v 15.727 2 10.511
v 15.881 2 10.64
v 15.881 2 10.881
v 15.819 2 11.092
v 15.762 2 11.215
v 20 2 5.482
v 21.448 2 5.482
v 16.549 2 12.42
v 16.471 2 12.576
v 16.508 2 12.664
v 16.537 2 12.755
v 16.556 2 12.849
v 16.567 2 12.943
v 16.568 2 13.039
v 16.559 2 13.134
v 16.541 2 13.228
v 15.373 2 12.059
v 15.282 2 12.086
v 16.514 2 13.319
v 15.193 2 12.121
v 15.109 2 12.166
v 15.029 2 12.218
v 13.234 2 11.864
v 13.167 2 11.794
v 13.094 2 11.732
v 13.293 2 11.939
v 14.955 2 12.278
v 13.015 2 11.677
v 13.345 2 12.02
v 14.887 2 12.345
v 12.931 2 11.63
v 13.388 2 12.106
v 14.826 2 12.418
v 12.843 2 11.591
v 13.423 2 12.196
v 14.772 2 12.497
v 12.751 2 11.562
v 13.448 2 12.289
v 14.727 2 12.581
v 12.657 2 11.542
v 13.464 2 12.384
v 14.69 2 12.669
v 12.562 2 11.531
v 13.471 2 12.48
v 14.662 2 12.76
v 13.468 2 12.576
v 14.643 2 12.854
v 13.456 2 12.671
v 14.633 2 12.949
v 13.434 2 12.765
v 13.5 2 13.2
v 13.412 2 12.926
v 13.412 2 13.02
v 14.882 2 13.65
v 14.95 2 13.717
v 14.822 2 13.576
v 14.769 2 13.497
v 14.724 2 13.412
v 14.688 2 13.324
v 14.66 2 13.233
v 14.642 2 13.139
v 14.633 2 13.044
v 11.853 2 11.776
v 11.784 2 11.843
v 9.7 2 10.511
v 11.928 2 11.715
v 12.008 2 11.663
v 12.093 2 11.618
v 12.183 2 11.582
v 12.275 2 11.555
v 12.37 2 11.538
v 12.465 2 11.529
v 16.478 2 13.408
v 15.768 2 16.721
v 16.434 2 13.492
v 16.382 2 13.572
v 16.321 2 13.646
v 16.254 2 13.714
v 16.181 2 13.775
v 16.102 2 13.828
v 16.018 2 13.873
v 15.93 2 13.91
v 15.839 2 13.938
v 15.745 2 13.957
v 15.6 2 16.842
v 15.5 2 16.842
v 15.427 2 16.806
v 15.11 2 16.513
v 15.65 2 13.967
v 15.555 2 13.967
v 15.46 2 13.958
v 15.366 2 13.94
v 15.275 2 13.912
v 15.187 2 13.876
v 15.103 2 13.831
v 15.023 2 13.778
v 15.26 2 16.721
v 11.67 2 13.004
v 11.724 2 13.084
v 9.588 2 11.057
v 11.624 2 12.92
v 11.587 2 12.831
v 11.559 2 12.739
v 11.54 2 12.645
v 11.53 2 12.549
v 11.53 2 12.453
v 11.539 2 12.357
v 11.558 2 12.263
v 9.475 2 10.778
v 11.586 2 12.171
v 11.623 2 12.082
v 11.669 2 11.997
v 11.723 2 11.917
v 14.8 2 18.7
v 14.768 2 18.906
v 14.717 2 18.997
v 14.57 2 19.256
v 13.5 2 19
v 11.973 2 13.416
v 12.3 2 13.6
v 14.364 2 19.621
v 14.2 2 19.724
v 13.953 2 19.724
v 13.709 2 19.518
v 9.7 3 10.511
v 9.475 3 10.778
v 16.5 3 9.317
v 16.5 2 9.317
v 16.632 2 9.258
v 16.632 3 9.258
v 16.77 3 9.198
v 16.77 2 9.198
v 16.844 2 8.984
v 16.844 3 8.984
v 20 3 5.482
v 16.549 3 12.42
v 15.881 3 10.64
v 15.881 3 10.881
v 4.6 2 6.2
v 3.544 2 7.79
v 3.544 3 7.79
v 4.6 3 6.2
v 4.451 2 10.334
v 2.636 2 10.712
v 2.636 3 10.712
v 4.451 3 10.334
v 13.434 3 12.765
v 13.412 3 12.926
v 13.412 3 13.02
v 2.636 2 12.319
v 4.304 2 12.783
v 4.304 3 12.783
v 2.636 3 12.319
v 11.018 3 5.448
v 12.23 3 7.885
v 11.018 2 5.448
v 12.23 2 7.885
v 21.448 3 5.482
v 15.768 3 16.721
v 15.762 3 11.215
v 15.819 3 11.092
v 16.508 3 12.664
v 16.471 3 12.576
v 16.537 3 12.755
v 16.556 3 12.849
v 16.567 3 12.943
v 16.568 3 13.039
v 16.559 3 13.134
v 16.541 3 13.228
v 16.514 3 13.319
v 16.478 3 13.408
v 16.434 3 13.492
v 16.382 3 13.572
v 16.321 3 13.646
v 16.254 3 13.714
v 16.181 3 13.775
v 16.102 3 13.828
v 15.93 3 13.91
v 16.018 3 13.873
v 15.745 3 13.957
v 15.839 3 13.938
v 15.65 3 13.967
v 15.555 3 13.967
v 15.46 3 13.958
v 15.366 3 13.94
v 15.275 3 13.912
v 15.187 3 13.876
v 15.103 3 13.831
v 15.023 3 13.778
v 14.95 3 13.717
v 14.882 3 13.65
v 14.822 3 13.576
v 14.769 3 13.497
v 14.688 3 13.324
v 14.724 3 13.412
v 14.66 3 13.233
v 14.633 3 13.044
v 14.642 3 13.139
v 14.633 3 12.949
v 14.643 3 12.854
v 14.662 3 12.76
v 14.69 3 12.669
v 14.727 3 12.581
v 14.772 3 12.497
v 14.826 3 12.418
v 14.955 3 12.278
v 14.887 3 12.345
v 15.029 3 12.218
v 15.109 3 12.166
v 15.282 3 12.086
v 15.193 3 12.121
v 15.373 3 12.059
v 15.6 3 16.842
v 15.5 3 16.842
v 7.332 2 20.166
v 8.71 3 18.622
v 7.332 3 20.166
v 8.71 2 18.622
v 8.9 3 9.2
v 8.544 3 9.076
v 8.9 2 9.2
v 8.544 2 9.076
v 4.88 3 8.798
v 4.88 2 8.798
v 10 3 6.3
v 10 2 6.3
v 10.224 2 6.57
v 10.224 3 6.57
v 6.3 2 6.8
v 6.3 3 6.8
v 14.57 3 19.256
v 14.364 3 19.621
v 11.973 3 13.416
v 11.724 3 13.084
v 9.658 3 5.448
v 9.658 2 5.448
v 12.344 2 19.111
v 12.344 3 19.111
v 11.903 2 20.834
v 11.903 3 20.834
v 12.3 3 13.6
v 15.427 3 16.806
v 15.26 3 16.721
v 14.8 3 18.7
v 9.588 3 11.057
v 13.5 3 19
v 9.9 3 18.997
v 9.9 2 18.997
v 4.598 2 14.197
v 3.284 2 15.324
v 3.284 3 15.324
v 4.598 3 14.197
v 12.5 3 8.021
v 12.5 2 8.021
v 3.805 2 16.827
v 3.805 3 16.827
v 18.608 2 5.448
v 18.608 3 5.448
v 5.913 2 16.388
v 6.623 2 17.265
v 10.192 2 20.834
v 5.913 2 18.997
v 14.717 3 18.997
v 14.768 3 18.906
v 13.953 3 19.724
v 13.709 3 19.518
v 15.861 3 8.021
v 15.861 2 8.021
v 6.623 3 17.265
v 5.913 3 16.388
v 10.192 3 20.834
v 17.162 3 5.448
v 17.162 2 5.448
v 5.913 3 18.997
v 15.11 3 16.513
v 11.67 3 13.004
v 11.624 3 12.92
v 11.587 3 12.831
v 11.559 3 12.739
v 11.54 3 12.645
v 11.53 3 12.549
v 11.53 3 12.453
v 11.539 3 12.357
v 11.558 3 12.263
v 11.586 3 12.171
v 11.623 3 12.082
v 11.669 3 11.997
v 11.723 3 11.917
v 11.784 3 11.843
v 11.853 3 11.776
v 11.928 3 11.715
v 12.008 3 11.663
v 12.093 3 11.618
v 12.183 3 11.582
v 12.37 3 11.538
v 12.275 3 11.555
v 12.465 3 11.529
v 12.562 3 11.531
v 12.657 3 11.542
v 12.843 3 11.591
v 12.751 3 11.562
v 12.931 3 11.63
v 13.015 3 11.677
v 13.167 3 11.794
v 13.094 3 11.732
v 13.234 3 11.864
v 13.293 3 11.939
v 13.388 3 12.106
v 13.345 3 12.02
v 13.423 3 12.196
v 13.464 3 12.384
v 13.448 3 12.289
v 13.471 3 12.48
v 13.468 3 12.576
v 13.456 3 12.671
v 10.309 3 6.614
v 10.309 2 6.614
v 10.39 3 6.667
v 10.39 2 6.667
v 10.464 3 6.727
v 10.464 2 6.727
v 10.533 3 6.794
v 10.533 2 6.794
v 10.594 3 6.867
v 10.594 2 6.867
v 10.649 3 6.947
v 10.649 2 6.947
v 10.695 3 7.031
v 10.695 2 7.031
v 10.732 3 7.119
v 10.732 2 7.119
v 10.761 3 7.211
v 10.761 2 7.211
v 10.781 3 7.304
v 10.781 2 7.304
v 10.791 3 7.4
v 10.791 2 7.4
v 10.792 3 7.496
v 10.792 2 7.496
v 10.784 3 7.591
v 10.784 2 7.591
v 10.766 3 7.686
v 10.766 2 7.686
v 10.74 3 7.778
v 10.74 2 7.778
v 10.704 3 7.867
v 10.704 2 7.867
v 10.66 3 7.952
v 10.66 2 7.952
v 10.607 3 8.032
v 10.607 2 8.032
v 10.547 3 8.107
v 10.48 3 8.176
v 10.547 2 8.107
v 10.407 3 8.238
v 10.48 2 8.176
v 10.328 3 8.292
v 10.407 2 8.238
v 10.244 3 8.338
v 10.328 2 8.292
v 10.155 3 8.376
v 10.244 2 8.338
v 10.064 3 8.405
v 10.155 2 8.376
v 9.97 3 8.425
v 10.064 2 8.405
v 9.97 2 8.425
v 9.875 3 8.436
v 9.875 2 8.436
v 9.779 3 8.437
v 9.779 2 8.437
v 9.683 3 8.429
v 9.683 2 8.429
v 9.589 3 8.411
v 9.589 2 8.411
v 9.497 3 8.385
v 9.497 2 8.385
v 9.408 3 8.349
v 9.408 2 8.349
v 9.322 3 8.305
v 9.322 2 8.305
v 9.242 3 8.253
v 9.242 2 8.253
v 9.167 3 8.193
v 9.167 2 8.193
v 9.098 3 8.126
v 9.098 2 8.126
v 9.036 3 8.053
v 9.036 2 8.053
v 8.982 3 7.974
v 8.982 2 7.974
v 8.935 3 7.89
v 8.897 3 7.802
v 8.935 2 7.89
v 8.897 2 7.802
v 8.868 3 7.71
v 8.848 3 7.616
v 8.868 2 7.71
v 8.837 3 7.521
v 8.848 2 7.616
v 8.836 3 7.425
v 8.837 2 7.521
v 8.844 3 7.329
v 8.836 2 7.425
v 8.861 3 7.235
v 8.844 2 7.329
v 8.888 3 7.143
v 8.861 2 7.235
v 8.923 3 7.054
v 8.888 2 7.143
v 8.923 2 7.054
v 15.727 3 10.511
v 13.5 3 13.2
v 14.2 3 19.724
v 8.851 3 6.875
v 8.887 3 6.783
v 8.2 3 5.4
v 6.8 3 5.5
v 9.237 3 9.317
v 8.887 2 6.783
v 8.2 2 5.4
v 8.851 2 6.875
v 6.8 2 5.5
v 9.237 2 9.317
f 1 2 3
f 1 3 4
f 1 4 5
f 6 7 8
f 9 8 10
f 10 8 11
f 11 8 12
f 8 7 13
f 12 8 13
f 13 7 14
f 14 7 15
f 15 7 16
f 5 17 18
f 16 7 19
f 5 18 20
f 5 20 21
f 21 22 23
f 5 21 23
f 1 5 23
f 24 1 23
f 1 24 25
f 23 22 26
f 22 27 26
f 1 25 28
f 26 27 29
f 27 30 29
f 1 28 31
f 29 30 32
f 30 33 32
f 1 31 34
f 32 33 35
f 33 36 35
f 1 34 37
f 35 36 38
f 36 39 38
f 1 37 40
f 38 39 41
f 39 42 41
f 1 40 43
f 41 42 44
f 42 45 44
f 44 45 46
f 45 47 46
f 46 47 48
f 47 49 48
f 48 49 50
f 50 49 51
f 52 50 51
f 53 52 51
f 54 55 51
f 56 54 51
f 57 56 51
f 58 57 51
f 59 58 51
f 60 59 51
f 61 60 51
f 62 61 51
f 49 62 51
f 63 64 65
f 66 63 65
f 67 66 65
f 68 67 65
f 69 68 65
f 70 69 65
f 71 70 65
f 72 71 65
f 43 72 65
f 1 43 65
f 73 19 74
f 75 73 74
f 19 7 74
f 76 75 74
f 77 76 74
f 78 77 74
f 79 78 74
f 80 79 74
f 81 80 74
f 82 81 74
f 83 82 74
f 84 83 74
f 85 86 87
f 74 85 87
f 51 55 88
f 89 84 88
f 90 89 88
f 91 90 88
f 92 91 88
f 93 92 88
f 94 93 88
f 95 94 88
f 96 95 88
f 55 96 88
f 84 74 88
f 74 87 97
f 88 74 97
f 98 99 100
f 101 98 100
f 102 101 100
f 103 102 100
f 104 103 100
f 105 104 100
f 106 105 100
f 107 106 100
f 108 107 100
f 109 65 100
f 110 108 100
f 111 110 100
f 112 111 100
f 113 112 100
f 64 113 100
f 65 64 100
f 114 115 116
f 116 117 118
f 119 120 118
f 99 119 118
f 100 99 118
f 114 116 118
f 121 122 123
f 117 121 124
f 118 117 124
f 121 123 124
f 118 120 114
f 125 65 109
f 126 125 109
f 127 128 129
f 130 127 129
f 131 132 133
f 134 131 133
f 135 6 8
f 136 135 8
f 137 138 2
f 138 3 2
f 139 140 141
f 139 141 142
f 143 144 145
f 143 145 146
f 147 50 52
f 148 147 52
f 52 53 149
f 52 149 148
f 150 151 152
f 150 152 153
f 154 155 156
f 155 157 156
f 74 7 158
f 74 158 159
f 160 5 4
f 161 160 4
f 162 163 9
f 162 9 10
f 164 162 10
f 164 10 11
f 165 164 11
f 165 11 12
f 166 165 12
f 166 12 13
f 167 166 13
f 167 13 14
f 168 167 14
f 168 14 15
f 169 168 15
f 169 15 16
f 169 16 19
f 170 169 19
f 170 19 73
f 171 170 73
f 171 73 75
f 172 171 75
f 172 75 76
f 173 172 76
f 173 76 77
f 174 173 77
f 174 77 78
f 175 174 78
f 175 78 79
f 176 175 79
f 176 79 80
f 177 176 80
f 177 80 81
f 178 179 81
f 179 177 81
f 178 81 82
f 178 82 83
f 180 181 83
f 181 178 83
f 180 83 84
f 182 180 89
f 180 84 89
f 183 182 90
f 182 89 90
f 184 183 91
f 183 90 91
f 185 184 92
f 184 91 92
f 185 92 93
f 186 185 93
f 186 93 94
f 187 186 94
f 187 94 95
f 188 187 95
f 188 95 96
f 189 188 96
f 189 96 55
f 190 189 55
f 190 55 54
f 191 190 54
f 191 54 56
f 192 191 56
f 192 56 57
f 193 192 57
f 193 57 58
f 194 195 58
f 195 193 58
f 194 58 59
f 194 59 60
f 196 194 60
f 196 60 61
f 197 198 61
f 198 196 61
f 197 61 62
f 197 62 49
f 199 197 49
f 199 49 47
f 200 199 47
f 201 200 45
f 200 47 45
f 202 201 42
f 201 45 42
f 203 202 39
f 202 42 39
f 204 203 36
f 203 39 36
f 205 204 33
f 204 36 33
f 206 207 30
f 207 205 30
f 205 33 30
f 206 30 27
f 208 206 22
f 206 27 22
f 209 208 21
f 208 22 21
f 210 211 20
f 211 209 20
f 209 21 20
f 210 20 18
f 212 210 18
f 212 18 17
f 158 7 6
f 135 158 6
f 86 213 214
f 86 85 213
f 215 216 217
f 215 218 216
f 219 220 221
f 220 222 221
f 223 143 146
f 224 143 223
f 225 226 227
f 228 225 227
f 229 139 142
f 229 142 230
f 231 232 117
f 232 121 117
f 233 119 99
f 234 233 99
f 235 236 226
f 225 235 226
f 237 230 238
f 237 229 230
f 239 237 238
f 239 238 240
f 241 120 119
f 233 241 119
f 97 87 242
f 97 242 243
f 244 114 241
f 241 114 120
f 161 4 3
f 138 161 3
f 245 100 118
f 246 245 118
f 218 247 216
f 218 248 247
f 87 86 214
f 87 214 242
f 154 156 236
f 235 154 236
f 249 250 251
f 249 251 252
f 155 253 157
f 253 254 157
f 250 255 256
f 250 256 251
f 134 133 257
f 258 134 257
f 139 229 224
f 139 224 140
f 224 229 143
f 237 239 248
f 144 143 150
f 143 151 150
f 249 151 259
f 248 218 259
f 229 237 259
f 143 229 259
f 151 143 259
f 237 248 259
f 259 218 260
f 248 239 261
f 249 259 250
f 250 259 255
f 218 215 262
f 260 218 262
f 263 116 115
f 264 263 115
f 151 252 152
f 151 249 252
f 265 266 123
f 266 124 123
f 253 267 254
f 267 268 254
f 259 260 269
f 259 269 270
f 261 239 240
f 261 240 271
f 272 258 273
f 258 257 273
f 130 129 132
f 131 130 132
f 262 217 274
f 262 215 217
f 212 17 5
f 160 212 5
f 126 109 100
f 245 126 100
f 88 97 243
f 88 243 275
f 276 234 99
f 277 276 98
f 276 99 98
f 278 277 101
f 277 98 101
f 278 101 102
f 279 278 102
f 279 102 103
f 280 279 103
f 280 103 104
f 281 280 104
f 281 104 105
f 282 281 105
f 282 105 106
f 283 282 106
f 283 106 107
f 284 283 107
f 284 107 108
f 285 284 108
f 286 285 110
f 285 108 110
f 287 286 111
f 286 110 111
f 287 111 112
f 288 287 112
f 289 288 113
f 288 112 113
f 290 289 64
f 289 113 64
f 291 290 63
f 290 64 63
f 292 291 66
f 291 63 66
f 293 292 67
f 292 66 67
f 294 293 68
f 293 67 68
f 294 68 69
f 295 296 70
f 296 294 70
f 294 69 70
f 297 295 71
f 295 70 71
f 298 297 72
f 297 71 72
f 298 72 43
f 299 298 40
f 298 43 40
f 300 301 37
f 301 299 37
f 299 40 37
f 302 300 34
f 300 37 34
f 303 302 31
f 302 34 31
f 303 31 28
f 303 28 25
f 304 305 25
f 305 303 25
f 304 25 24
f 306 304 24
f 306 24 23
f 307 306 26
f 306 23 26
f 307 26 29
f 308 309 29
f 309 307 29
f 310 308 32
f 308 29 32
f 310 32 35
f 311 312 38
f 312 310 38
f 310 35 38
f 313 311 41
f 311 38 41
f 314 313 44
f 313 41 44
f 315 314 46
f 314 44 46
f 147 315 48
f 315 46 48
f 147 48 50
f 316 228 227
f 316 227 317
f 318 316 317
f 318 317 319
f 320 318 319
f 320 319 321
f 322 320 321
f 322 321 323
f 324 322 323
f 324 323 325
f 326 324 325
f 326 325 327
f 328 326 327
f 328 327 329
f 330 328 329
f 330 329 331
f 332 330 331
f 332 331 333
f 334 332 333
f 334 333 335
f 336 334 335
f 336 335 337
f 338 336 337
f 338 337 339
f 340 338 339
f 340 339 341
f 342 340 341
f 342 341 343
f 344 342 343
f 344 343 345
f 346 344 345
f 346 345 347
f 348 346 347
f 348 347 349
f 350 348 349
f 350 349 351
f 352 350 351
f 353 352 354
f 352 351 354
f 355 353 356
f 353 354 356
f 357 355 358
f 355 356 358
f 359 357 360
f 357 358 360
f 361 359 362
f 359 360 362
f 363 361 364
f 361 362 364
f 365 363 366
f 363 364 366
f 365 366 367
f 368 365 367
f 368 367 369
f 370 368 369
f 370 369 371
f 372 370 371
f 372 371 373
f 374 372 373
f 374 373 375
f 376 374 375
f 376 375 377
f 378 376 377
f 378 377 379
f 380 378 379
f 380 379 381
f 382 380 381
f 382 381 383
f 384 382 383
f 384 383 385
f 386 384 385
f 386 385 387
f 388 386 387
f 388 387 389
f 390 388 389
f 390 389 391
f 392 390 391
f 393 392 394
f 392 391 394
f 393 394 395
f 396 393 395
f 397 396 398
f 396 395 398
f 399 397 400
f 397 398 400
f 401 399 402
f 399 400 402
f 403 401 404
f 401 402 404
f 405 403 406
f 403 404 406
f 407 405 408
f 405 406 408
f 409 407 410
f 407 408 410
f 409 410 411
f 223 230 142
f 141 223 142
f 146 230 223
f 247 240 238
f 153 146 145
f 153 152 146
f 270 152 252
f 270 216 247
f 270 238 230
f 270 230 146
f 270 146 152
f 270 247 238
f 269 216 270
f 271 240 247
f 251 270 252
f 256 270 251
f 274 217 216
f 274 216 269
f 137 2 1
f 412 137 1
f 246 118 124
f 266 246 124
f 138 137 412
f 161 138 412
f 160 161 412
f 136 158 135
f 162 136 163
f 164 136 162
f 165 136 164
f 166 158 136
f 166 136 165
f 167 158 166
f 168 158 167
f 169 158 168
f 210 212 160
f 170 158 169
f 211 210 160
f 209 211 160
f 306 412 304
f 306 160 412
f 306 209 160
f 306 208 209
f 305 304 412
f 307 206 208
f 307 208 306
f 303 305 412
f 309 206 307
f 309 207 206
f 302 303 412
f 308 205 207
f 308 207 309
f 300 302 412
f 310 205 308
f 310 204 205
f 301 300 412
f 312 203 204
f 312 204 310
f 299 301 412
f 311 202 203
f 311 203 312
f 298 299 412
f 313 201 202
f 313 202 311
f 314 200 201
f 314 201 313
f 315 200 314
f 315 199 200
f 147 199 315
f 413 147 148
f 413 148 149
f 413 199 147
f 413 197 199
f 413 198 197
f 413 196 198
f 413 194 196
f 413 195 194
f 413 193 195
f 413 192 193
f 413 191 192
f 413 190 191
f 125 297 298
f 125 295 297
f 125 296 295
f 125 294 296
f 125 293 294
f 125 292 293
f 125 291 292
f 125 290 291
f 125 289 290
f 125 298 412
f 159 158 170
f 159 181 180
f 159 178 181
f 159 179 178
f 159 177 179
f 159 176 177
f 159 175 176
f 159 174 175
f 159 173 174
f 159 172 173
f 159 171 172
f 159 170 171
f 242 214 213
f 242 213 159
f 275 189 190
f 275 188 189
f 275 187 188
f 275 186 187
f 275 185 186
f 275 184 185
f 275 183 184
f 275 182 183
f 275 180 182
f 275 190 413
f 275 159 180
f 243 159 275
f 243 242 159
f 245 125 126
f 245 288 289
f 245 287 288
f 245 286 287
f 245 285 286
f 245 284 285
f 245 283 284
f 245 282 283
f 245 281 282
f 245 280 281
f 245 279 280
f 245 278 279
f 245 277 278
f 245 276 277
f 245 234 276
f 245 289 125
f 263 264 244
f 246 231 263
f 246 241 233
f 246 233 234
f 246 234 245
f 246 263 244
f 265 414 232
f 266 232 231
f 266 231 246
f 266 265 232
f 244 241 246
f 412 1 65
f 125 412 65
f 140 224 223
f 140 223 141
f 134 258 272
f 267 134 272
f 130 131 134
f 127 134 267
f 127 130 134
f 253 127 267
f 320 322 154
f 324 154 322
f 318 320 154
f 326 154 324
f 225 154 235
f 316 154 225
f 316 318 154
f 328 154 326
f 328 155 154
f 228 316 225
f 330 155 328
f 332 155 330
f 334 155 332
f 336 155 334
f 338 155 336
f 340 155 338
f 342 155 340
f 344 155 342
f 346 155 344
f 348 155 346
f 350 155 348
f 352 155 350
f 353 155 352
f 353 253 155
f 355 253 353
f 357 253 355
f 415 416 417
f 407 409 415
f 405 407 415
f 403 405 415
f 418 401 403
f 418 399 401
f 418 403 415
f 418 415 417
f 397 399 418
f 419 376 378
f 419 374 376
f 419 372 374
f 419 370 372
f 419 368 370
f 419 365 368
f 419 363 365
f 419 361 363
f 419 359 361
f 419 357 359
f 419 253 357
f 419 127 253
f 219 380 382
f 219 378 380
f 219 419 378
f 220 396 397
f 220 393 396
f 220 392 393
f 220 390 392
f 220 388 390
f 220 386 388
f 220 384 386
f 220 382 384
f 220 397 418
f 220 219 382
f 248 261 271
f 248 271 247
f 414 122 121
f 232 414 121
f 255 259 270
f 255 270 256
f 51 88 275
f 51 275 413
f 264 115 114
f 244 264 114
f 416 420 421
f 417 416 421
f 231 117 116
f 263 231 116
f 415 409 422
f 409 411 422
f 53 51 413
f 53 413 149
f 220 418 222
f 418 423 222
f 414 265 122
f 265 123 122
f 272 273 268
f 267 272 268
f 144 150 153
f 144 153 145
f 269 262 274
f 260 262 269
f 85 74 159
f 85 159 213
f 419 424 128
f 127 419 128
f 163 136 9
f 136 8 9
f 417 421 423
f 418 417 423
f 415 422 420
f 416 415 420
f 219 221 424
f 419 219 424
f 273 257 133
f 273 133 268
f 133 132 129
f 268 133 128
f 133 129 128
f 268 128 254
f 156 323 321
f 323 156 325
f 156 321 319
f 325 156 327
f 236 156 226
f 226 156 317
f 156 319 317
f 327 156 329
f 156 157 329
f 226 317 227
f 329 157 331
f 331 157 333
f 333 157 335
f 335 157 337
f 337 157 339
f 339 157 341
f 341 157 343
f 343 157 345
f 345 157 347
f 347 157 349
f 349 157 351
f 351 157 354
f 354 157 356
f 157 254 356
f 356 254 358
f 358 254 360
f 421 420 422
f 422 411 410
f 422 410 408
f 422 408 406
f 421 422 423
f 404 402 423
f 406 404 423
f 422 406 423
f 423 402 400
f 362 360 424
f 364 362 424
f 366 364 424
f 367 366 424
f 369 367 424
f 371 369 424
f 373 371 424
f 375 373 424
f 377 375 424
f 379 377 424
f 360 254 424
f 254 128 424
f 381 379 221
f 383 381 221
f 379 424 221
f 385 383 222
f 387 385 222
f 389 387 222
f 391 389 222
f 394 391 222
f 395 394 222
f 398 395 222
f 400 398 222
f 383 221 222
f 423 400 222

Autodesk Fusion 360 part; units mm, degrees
sketch "Esquisse3" plane through (0, 2, 0) normal (0, 1, 0) x (-1, 0, 0)
  line L0 (0, 25) -> (-24, 25)
  line L1 (-24, 25) -> (-24, 0)
  line L2 (-24, 0) -> (0, 0)
  line L3 (0, 0) -> (0, 25)
  line L4 (-21.448, 5.4824) -> (-20, 5.4824)
  line L5 (-20, 5.4824) -> (-16.5487, 12.4198)
  circle A0 centre (-15.6, 13) radius 0.9683
  circle A1 centre (-12.5, 12.5) radius 0.9713
  circle A2 centre (-9.8142, 7.4586) radius 0.9789
  line L6 (-15.3731, 12.0586) -> (-15.7623, 11.2146)
  line L7 (-15.7623, 11.2146) -> (-15.8189, 11.0919)
  line L8 (-15.8189, 11.0919) -> (-15.8811, 10.8807)
  line L9 (-15.8811, 10.8807) -> (-15.8811, 10.6756)
  line L10 (-15.8811, 10.6756) -> (-15.8811, 10.6405)
  line L11 (-15.8811, 10.6405) -> (-15.7272, 10.5109)
  line L12 (-15.7272, 10.5109) -> (-9.9, 10.5109)
  line L13 (-9.9, 10.5109) -> (-9.7, 10.5109)
  line L14 (-9.7, 10.5109) -> (-9.4749, 10.7781)
  line L15 (-9.4749, 10.7781) -> (-9.5875, 11.0568)
  line L16 (-9.5875, 11.0568) -> (-13.5, 19)
  line L17 (-13.5, 19) -> (-13.7093, 19.5183)
  line L18 (-13.7093, 19.5183) -> (-13.9534, 19.7239)
  line L19 (-13.9534, 19.7239) -> (-14.2, 19.7239)
  line L20 (-14.2, 19.7239) -> (-14.3641, 19.6211)
  line L21 (-14.3641, 19.6211) -> (-14.5703, 19.2561)
  line L22 (-14.5703, 19.2561) -> (-14.7167, 18.9969)
  line L23 (-14.7167, 18.9969) -> (-14.7682, 18.9058)
  line L24 (-14.7682, 18.9058) -> (-14.8, 18.7)
  line L25 (-14.8, 18.7) -> (-12.3, 13.6)
  line L26 (-12.3, 13.6) -> (-11.9733, 13.4155)
  line L27 (-11.9733, 13.4155) -> (-11.7239, 13.0839)
  line L28 (-21.448, 5.4824) -> (-15.7676, 16.7212)
  line L29 (-15.7676, 16.7212) -> (-15.6, 16.8425)
  line L30 (-15.6, 16.8425) -> (-15.5, 16.8425)
  line L31 (-15.5, 16.8425) -> (-15.4271, 16.8056)
  line L32 (-15.4271, 16.8056) -> (-15.2601, 16.7212)
  line L33 (-15.2601, 16.7212) -> (-15.1097, 16.5133)
  line L34 (-15.1097, 16.5133) -> (-13.5, 13.2)
  line L35 (-13.5, 13.2) -> (-13.4125, 13.0199)
  line L36 (-13.4125, 13.0199) -> (-13.4125, 12.8327)
  line L37 (-13.4344, 12.7651) -> (-13.4125, 12.9263)
  line L38 (-16.5487, 12.4198) -> (-16.4708, 12.5764)
  line L39 (-18.6078, 5.4476) -> (-17.1615, 5.4476)
  line L40 (-17.1615, 5.4476) -> (-15.8607, 8.0212)
  line L41 (-15.8607, 8.0212) -> (-12.5, 8.0212)
  line L42 (-12.5, 8.0212) -> (-12.2305, 7.885)
  line L43 (-12.2305, 7.885) -> (-11.0177, 5.4476)
  line L44 (-11.0177, 5.4476) -> (-9.6577, 5.4476)
  line L45 (-9.6577, 5.4476) -> (-10, 6.3)
  line L46 (-10, 6.3) -> (-10.2242, 6.5696)
  line L47 (-8.923, 7.0537) -> (-8.8514, 6.8754)
  line L48 (-8.8514, 6.8754) -> (-8.8872, 6.7833)
  line L49 (-8.8872, 6.7833) -> (-8.2, 5.4)
  line L50 (-8.2, 5.4) -> (-6.8, 5.5)
  line L51 (-6.8, 5.5) -> (-8.5436, 9.0762)
  line L52 (-8.5436, 9.0762) -> (-8.9, 9.2)
  line L53 (-8.9, 9.2) -> (-9.2369, 9.317)
  line L54 (-9.2369, 9.317) -> (-16.5, 9.317)
  line L55 (-16.5, 9.317) -> (-16.6325, 9.2585)
  line L56 (-16.6325, 9.2585) -> (-16.7698, 9.1979)
  line L57 (-16.7698, 9.1979) -> (-16.8443, 8.9836)
  line L58 (-16.8443, 8.9836) -> (-18.6078, 5.4476)
  line L59 (-11.9031, 20.8338) -> (-10.1917, 20.8338)
  line L60 (-10.1917, 20.8338) -> (-9.9, 18.9972)
  line L61 (-9.9, 18.9972) -> (-8.7099, 18.6215)
  line L62 (-8.7099, 18.6215) -> (-7.3324, 20.1659)
  line L63 (-7.3324, 20.1659) -> (-5.9132, 18.9972)
  line L64 (-5.9132, 18.9972) -> (-6.6228, 17.2649)
  line L65 (-6.6228, 17.2649) -> (-5.9132, 16.3883)
  line L66 (-5.9132, 16.3883) -> (-3.8053, 16.8266)
  line L67 (-3.8053, 16.8266) -> (-3.2835, 15.3239)
  line L68 (-3.2835, 15.3239) -> (-4.5983, 14.1969)
  line L69 (-4.5983, 14.1969) -> (-4.3044, 12.7832)
  line L70 (-4.3044, 12.7832) -> (-2.6365, 12.3186)
  line L71 (-2.6365, 12.3186) -> (-2.6365, 10.7115)
  line L72 (-2.6365, 10.7115) -> (-4.4514, 10.3342)
  line L73 (-4.4514, 10.3342) -> (-4.8795, 8.7976)
  line L74 (-4.8795, 8.7976) -> (-3.5439, 7.7896)
  line L75 (-3.5439, 7.7896) -> (-4.6, 6.2)
  line L76 (-4.6, 6.2) -> (-6.3, 6.8)
  line L77 (-6.3, 6.8) -> (-12.3438, 19.1111)
  line L78 (-12.3438, 19.1111) -> (-11.9031, 20.8338)
extrude "Extrusion2" add sketch "Esquisse3" along normal blind 1 contours L4 L5 A0 A1 L6 L7 L8 L9 L10 L11 L12 L13 L14 L15 L16 L17 L18 L19 L20 L21 L22 L23 L24 L25 L26 L27 L28 L29 L30 L31 L32 L33 L34 L35 L36 L37 L38 | A2 L39 L40 L41 L42 L43 L44 L45 L46 L47 L48 L49 L50 L51 L52 L53 L54 L55 L56 L57 L58 | L59 L60 L61 L62 L63 L64 L65 L66 L67 L68 L69 L70 L71 L72 L73 L74 L75 L76 L77 L78 makes body 1 at (13.5333, 2, 17.1) makes body 2 at (8.1857, 2, 14.0998) makes body 3 at (12.7456, 2, 8.8851)
